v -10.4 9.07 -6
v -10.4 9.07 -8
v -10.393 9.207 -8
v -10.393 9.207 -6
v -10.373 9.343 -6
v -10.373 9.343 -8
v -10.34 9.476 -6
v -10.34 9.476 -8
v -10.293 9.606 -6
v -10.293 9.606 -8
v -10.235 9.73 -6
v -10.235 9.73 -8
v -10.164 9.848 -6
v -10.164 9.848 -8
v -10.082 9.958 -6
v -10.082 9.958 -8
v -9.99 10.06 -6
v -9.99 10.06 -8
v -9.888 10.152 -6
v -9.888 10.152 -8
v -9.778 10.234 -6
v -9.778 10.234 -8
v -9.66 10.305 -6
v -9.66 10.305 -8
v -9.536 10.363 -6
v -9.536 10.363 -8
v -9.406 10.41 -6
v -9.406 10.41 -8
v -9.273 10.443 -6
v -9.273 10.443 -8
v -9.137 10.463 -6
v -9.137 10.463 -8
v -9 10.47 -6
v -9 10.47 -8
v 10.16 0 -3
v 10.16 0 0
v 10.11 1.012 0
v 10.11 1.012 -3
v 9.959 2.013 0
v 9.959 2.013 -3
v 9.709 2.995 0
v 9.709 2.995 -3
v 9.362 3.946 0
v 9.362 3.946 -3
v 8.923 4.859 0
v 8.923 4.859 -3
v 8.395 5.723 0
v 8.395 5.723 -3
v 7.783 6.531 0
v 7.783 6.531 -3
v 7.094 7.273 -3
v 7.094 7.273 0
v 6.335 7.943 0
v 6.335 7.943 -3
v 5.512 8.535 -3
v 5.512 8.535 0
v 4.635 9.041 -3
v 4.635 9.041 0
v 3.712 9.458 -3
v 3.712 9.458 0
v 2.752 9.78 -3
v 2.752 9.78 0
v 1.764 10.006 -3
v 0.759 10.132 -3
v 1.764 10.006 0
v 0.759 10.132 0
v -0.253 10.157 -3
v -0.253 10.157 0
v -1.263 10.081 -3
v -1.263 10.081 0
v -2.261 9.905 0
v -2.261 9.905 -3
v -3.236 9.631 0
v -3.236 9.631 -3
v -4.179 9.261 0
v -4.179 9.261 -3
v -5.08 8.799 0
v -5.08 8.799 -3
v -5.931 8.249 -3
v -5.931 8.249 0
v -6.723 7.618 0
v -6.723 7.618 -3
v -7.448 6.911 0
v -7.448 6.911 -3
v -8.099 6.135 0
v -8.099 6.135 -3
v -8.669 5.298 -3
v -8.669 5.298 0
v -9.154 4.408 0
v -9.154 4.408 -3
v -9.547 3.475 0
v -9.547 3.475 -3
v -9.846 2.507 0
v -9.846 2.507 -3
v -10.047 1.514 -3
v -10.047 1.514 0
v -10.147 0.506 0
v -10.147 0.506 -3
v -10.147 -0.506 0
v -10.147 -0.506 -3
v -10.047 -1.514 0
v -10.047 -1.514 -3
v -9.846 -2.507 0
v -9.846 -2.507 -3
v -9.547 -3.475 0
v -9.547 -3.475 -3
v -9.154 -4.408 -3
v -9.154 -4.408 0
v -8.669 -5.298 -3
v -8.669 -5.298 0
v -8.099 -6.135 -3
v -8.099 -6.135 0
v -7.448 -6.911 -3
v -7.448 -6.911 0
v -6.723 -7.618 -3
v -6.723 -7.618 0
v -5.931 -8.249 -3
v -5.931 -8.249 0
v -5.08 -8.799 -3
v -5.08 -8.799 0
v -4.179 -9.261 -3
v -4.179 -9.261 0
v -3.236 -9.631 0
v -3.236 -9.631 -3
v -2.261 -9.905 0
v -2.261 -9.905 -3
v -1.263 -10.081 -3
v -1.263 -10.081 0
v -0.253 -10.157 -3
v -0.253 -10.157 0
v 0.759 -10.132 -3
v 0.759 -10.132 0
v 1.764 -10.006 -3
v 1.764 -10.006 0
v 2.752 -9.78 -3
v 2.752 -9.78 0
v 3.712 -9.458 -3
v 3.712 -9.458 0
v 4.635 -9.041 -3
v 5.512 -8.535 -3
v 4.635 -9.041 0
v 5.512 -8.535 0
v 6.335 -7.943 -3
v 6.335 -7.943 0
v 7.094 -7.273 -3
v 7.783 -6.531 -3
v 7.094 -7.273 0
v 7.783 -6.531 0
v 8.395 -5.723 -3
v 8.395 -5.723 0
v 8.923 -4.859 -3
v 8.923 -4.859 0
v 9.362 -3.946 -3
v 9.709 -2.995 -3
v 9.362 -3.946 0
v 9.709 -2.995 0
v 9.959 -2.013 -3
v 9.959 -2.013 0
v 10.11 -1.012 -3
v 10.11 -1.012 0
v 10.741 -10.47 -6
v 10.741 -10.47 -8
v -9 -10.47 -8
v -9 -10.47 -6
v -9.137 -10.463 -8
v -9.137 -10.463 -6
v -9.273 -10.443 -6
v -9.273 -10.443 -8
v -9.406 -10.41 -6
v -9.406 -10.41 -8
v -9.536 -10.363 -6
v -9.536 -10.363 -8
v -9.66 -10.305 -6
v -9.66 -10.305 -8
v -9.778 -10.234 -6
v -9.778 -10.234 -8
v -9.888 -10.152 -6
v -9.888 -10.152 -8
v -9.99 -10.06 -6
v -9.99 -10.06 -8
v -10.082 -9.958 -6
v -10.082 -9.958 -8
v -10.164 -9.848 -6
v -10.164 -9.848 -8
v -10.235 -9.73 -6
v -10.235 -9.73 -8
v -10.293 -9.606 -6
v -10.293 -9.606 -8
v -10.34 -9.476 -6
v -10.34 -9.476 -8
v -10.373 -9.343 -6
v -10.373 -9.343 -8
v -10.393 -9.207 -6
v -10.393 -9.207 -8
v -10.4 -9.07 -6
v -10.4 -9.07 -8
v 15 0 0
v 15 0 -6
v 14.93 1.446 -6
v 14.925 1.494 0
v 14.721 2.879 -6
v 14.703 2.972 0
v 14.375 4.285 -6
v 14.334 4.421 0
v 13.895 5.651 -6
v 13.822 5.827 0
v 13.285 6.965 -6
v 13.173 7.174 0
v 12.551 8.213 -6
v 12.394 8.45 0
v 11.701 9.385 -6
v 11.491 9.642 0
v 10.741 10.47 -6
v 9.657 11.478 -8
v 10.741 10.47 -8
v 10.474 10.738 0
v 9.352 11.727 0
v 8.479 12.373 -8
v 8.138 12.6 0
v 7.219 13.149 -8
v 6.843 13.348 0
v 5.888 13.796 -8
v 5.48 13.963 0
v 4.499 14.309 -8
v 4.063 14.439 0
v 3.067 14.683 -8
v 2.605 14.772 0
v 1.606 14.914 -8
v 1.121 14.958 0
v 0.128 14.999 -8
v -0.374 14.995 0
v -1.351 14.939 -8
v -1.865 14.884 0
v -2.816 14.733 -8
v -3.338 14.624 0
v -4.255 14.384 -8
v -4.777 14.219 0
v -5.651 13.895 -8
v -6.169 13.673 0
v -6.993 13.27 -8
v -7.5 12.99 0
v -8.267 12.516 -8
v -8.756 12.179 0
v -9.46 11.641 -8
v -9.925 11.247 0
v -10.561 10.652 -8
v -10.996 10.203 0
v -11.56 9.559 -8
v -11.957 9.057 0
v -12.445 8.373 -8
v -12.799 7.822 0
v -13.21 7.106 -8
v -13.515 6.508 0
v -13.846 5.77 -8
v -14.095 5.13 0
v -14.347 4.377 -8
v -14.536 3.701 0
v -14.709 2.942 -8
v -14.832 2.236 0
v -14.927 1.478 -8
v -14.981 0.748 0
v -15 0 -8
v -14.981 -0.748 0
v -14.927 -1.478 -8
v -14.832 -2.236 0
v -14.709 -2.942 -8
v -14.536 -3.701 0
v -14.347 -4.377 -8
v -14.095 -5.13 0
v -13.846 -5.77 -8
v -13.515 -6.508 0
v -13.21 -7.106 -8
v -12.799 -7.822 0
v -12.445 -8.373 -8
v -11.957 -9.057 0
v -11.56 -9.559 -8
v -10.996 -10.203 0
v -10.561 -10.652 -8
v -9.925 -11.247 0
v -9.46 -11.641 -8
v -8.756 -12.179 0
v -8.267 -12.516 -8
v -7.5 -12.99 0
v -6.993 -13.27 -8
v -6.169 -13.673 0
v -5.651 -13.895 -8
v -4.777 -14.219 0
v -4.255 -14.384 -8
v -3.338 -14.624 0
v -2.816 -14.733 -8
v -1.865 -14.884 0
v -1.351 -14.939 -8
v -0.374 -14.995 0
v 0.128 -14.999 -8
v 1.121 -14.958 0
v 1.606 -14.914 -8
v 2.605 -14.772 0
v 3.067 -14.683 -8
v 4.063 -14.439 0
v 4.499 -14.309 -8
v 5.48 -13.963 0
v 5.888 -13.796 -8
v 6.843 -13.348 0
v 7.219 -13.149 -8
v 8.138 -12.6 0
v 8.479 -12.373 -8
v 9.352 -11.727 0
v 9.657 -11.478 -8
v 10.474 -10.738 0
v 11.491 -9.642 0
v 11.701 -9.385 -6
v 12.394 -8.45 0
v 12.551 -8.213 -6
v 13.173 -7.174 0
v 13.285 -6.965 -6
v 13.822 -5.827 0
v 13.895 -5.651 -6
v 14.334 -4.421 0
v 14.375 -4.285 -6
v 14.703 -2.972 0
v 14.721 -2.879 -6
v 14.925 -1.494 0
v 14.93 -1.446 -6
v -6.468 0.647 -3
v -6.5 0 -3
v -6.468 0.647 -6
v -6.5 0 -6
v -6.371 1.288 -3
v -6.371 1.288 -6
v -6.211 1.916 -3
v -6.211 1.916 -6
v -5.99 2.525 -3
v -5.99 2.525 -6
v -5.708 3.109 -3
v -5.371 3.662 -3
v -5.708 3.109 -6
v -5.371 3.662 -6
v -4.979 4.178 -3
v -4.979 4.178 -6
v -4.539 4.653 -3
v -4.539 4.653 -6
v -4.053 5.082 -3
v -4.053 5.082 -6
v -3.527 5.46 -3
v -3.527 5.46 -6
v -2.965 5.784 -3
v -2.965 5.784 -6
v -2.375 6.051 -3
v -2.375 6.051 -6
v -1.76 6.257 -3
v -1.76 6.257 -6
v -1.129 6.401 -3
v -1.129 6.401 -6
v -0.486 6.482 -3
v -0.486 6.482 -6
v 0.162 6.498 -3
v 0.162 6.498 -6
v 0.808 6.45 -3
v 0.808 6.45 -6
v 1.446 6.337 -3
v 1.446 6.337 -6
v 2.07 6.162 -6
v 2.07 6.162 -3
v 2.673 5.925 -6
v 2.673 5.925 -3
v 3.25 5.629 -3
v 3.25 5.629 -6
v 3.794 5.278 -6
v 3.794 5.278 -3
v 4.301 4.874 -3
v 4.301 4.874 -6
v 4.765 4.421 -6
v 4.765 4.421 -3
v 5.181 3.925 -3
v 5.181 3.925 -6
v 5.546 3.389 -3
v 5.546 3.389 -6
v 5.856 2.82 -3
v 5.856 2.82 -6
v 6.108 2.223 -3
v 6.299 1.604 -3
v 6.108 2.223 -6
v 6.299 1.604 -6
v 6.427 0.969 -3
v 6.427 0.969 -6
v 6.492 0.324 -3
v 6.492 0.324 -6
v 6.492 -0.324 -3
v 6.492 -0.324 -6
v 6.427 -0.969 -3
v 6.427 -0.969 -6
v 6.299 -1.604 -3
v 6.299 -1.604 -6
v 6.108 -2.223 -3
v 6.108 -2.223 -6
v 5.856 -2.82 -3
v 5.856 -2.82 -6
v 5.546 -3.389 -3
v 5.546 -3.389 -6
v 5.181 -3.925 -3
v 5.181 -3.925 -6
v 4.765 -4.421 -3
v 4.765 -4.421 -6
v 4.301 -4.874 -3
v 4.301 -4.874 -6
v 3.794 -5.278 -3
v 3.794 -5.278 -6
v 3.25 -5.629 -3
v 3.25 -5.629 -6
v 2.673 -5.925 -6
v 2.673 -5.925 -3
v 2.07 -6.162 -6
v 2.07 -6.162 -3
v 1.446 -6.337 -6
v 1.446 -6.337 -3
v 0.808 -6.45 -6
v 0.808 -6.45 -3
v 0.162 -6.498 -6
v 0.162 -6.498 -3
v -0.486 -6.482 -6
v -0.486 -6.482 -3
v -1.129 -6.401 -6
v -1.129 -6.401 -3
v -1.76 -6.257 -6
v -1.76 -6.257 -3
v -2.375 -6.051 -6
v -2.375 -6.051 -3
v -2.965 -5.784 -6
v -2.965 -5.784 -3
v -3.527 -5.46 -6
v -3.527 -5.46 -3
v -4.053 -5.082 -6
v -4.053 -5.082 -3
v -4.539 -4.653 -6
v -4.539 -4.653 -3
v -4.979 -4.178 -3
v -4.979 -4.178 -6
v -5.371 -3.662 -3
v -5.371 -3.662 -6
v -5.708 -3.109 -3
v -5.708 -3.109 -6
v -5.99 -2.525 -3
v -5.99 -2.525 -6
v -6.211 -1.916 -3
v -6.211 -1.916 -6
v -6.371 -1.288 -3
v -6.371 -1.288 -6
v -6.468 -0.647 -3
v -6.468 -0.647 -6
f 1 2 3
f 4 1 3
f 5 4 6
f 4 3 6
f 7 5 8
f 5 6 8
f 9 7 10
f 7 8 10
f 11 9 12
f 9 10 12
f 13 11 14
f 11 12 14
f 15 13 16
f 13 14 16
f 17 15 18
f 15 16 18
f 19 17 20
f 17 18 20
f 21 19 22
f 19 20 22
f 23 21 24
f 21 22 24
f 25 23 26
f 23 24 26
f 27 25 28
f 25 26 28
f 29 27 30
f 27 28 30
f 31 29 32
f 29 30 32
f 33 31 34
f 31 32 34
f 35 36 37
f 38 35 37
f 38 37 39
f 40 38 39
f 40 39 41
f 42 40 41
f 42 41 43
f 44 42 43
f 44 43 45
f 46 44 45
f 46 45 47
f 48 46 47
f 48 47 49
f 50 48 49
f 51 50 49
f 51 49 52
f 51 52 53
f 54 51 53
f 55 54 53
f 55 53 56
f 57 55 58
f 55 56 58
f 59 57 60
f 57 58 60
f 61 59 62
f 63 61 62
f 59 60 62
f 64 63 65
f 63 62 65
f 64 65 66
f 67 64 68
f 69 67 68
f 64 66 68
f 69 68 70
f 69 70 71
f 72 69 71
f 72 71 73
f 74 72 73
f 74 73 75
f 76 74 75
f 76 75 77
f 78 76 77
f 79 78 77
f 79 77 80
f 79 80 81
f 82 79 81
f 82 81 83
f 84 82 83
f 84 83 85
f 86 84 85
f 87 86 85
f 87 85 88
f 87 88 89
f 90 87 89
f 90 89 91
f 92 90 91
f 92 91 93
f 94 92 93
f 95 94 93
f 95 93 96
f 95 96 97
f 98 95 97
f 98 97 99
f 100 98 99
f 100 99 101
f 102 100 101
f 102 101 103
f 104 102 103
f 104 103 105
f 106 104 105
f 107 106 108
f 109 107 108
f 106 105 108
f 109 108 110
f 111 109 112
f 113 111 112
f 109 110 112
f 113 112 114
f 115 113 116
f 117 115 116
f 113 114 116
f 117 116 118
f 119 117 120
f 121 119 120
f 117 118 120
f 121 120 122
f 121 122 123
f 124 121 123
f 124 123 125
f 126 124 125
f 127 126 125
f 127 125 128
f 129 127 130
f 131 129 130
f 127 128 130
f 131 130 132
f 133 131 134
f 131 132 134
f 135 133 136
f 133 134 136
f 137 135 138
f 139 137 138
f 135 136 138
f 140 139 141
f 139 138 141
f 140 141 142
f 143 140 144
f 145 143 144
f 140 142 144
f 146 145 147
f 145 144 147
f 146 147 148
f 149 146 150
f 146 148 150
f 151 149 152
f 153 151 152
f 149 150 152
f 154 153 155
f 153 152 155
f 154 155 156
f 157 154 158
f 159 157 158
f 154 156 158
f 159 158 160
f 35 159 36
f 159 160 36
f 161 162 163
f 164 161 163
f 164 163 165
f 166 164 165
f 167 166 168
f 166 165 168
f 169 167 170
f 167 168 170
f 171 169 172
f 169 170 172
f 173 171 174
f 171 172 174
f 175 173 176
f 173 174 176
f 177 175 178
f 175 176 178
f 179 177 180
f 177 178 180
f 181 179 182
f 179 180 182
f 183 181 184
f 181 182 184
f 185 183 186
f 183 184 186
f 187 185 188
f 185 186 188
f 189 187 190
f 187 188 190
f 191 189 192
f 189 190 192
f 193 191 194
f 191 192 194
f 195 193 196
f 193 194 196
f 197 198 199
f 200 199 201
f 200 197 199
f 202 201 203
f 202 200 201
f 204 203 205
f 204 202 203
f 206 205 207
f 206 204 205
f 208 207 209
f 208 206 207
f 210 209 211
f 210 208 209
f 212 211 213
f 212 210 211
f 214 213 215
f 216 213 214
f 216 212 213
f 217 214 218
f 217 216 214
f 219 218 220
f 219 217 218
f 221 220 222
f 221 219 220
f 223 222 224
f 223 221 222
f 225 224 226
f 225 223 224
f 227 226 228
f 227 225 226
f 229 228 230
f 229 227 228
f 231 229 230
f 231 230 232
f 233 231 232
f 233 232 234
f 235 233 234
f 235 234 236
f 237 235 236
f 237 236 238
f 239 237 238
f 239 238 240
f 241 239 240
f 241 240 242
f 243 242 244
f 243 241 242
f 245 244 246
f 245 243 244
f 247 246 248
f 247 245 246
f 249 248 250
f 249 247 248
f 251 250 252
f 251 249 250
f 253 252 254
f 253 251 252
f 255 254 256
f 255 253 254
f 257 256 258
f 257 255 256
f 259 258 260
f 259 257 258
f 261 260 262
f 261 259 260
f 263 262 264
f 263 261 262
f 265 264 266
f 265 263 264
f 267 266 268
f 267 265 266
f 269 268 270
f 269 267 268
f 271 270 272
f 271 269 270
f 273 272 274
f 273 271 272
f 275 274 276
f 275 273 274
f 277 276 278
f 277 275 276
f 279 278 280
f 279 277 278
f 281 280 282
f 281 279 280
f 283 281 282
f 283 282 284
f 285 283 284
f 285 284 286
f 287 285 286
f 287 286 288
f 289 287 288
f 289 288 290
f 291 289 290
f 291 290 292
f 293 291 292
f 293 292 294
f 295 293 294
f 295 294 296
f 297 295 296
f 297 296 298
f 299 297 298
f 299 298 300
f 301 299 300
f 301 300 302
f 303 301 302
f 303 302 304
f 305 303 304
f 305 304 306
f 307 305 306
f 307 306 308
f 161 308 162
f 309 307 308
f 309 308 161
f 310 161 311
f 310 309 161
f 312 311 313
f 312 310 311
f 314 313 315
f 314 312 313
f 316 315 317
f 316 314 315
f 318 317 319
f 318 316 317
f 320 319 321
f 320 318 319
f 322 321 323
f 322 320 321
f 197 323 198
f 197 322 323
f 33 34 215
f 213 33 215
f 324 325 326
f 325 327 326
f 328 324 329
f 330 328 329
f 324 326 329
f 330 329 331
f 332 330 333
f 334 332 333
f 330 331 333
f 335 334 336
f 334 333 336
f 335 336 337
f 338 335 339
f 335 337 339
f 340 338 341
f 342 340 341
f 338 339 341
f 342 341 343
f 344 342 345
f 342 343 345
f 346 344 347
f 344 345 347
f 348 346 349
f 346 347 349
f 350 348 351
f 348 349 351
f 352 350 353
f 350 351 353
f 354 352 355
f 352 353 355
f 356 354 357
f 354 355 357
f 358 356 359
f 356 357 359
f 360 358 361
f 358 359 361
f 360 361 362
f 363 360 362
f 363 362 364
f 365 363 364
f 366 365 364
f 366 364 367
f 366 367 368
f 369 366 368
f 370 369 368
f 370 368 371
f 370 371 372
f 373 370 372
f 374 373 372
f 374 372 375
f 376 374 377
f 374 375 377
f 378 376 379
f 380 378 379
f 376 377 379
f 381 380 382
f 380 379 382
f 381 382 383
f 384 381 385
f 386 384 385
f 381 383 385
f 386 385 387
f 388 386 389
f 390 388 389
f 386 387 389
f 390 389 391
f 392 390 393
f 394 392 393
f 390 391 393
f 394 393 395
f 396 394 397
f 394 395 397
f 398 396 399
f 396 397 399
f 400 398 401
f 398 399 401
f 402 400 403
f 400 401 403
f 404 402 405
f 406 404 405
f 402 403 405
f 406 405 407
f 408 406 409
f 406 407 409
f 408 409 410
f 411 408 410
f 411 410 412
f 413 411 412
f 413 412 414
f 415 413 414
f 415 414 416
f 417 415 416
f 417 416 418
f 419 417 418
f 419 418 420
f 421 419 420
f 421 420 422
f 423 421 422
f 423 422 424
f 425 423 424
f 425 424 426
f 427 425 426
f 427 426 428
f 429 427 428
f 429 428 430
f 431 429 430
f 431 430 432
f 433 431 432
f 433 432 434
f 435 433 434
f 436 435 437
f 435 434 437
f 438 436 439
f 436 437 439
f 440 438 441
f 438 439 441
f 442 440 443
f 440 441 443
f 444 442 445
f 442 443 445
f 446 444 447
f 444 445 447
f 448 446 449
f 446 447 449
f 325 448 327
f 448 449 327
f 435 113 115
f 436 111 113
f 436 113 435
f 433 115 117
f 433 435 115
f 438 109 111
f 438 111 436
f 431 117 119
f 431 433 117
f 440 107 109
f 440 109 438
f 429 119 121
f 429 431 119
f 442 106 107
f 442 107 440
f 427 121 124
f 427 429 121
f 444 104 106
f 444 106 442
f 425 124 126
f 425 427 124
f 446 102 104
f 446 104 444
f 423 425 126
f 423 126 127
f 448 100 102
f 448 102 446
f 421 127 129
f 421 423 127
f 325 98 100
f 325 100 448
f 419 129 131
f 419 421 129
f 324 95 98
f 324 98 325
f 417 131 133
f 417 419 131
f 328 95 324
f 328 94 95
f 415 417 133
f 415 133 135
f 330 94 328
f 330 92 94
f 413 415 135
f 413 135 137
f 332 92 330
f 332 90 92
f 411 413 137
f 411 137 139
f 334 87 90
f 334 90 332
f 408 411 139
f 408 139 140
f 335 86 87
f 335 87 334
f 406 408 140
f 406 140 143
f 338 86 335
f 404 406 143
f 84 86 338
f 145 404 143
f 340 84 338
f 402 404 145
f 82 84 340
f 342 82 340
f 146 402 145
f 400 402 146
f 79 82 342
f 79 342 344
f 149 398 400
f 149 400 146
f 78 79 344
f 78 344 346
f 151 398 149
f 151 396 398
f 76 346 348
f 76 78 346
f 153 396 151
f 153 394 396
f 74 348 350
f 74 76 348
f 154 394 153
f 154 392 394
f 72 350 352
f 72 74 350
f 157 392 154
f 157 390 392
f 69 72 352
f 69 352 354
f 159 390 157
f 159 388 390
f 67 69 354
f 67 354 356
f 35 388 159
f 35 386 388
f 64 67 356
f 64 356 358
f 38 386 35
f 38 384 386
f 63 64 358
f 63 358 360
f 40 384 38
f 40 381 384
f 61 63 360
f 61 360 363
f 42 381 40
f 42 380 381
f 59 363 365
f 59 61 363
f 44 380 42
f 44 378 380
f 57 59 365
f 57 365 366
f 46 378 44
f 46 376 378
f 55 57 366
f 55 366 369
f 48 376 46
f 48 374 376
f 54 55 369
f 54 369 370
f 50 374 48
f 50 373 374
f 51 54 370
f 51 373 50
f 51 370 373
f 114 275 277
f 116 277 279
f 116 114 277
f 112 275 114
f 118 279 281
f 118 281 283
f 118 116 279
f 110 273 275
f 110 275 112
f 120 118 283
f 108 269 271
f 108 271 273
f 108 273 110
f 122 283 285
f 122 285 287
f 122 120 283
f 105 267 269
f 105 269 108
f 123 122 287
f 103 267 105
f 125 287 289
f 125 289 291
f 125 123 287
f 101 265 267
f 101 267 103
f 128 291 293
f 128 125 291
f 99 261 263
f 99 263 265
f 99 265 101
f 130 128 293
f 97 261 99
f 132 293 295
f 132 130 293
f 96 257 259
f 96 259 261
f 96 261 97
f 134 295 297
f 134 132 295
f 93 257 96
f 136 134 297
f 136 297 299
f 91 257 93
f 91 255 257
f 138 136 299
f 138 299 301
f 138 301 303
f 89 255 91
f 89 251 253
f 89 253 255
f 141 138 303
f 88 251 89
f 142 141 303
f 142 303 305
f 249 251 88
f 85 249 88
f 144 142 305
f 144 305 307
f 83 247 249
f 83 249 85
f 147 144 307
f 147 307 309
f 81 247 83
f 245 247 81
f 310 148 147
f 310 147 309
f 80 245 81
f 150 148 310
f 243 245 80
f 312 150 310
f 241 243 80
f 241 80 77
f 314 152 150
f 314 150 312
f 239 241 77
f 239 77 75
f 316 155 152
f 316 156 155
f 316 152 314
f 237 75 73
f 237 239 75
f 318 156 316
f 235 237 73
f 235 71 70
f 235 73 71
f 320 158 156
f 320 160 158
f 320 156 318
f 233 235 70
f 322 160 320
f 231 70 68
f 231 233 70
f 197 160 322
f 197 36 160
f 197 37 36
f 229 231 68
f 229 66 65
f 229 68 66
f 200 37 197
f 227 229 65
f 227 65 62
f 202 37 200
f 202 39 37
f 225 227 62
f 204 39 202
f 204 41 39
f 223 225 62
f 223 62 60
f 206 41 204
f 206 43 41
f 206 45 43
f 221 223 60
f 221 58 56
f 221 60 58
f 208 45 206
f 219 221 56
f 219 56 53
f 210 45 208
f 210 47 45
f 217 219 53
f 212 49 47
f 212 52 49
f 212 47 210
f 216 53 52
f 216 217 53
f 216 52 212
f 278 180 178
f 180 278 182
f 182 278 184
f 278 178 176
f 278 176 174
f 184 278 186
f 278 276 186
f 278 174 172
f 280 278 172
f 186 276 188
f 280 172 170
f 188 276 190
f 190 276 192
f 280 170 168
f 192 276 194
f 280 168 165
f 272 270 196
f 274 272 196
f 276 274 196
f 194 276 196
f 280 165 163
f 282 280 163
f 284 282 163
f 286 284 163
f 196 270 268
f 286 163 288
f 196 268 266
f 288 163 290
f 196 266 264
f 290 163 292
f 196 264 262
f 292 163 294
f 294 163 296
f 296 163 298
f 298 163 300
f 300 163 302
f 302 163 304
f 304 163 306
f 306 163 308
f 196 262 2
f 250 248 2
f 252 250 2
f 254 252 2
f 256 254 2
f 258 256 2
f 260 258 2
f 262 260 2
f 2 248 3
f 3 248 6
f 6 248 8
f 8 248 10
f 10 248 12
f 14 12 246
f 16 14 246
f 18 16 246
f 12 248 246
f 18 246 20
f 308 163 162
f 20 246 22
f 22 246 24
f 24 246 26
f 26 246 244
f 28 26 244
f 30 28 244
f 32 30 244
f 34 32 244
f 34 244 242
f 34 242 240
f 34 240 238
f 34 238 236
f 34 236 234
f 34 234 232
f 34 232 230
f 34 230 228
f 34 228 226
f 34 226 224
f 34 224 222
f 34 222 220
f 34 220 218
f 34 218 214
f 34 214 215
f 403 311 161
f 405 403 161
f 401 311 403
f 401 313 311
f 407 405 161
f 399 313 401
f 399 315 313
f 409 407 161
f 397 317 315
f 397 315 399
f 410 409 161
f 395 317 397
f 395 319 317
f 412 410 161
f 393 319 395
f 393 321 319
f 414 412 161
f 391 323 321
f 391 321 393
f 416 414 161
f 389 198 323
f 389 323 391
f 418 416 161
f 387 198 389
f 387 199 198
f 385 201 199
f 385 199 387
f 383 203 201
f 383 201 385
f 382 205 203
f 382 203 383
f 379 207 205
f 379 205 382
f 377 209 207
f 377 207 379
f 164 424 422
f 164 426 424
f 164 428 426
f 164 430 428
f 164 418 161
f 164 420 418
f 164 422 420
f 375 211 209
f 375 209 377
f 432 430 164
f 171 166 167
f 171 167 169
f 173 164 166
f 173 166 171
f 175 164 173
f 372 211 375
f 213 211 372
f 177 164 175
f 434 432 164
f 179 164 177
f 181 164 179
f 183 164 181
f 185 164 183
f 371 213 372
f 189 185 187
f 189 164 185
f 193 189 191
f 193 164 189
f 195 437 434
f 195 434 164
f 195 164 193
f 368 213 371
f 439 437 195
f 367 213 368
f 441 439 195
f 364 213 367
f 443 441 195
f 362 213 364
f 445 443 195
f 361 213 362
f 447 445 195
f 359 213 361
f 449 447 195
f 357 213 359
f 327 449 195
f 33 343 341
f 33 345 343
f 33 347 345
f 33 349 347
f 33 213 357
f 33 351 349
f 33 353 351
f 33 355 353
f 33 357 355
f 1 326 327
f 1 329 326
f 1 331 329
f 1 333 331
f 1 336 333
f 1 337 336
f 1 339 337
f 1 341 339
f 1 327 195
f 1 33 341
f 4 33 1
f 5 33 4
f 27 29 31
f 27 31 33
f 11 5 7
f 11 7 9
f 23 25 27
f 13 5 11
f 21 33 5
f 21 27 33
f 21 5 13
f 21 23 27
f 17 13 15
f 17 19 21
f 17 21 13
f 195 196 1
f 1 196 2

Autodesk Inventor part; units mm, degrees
ref_plane "YZ Plane" through (0, 0, 0) normal (1, 0, 0) x (0, 1, 0)
ref_plane "XZ Plane" through (0, 0, 0) normal (0, 1, 0) x (-1, 0, 0)
ref_plane "XY Plane" through (0, 0, 0) normal (0, 0, 1) x (1, 0, 0)
sketch "Sketch8" plane through (0, 0, 0) normal (0, 0, 1) x (1, 0, 0)
  circle A0 centre (0, 0) radius 15
  dimension "d33" = 30
extrude "Extrusion7" add sketch "Sketch8" against normal blind 8
sketch "Sketch10" plane through (0, 0, -8) normal (0, 0, -1) x (-1, 0, 0)
  line L0 (9, 10.07) -> (-29.1, 10.07)
  arc A0 (10, 9.07) -> (9, 10.07) centre (9, 9.07) ccw
  line L1 (10, 9.07) -> (10, -9.07)
  arc A1 (9, -10.07) -> (10, -9.07) centre (9, -9.07) ccw
  line L2 (-29.1, -10.07) -> (9, -10.07)
  line L3 (-29.1, 10.07) -> (-29.1, -10.07)
  arc A2 (9, -10.47) -> (10.4, -9.07) centre (9, -9.07) ccw
  line L4 (10.4, -9.07) -> (10.4, 9.07)
  arc A3 (10.4, 9.07) -> (9, 10.47) centre (9, 9.07) ccw
  line L5 (9, 10.47) -> (-29.5, 10.47)
  line L6 (-29.5, 10.47) -> (-29.5, -10.47)
  line L7 (-29.5, -10.47) -> (9, -10.47)
  dimension "d59" = 0.4
extrude "Extrusion8" cut sketch "Sketch10" against normal blind 2 contours A0 L1 A1 L2 L3 L0 | L7 L6 L5 A3 L4 A2
sketch "Sketch11" plane through (0, 0, -6) normal (0, 0, -1) x (-1, 0, 0)
  circle A0 centre (0, 0) radius 6.4
  circle A1 centre (0, 0) radius 6.5
  point P0 (0, 0)
  dimension "d58" = 13
extrude "Extrusion9" cut sketch "Sketch11" against normal through all contours A0 | A1
sketch "Sketch13" plane through (0, 0, 0) normal (0, 0, 1) x (1, 0, 0)
  circle A0 centre (0, 0) radius 9.96
  circle A1 centre (0, 0) radius 10.16
  point P0 (0, 0)
  dimension "d44" = 0.2
extrude "Extrusion11" cut sketch "Sketch13" against normal blind 3 contours A0 | A1
properties part number "axis_19_bottom_frame" material "Aluminum 6061-AHC"
